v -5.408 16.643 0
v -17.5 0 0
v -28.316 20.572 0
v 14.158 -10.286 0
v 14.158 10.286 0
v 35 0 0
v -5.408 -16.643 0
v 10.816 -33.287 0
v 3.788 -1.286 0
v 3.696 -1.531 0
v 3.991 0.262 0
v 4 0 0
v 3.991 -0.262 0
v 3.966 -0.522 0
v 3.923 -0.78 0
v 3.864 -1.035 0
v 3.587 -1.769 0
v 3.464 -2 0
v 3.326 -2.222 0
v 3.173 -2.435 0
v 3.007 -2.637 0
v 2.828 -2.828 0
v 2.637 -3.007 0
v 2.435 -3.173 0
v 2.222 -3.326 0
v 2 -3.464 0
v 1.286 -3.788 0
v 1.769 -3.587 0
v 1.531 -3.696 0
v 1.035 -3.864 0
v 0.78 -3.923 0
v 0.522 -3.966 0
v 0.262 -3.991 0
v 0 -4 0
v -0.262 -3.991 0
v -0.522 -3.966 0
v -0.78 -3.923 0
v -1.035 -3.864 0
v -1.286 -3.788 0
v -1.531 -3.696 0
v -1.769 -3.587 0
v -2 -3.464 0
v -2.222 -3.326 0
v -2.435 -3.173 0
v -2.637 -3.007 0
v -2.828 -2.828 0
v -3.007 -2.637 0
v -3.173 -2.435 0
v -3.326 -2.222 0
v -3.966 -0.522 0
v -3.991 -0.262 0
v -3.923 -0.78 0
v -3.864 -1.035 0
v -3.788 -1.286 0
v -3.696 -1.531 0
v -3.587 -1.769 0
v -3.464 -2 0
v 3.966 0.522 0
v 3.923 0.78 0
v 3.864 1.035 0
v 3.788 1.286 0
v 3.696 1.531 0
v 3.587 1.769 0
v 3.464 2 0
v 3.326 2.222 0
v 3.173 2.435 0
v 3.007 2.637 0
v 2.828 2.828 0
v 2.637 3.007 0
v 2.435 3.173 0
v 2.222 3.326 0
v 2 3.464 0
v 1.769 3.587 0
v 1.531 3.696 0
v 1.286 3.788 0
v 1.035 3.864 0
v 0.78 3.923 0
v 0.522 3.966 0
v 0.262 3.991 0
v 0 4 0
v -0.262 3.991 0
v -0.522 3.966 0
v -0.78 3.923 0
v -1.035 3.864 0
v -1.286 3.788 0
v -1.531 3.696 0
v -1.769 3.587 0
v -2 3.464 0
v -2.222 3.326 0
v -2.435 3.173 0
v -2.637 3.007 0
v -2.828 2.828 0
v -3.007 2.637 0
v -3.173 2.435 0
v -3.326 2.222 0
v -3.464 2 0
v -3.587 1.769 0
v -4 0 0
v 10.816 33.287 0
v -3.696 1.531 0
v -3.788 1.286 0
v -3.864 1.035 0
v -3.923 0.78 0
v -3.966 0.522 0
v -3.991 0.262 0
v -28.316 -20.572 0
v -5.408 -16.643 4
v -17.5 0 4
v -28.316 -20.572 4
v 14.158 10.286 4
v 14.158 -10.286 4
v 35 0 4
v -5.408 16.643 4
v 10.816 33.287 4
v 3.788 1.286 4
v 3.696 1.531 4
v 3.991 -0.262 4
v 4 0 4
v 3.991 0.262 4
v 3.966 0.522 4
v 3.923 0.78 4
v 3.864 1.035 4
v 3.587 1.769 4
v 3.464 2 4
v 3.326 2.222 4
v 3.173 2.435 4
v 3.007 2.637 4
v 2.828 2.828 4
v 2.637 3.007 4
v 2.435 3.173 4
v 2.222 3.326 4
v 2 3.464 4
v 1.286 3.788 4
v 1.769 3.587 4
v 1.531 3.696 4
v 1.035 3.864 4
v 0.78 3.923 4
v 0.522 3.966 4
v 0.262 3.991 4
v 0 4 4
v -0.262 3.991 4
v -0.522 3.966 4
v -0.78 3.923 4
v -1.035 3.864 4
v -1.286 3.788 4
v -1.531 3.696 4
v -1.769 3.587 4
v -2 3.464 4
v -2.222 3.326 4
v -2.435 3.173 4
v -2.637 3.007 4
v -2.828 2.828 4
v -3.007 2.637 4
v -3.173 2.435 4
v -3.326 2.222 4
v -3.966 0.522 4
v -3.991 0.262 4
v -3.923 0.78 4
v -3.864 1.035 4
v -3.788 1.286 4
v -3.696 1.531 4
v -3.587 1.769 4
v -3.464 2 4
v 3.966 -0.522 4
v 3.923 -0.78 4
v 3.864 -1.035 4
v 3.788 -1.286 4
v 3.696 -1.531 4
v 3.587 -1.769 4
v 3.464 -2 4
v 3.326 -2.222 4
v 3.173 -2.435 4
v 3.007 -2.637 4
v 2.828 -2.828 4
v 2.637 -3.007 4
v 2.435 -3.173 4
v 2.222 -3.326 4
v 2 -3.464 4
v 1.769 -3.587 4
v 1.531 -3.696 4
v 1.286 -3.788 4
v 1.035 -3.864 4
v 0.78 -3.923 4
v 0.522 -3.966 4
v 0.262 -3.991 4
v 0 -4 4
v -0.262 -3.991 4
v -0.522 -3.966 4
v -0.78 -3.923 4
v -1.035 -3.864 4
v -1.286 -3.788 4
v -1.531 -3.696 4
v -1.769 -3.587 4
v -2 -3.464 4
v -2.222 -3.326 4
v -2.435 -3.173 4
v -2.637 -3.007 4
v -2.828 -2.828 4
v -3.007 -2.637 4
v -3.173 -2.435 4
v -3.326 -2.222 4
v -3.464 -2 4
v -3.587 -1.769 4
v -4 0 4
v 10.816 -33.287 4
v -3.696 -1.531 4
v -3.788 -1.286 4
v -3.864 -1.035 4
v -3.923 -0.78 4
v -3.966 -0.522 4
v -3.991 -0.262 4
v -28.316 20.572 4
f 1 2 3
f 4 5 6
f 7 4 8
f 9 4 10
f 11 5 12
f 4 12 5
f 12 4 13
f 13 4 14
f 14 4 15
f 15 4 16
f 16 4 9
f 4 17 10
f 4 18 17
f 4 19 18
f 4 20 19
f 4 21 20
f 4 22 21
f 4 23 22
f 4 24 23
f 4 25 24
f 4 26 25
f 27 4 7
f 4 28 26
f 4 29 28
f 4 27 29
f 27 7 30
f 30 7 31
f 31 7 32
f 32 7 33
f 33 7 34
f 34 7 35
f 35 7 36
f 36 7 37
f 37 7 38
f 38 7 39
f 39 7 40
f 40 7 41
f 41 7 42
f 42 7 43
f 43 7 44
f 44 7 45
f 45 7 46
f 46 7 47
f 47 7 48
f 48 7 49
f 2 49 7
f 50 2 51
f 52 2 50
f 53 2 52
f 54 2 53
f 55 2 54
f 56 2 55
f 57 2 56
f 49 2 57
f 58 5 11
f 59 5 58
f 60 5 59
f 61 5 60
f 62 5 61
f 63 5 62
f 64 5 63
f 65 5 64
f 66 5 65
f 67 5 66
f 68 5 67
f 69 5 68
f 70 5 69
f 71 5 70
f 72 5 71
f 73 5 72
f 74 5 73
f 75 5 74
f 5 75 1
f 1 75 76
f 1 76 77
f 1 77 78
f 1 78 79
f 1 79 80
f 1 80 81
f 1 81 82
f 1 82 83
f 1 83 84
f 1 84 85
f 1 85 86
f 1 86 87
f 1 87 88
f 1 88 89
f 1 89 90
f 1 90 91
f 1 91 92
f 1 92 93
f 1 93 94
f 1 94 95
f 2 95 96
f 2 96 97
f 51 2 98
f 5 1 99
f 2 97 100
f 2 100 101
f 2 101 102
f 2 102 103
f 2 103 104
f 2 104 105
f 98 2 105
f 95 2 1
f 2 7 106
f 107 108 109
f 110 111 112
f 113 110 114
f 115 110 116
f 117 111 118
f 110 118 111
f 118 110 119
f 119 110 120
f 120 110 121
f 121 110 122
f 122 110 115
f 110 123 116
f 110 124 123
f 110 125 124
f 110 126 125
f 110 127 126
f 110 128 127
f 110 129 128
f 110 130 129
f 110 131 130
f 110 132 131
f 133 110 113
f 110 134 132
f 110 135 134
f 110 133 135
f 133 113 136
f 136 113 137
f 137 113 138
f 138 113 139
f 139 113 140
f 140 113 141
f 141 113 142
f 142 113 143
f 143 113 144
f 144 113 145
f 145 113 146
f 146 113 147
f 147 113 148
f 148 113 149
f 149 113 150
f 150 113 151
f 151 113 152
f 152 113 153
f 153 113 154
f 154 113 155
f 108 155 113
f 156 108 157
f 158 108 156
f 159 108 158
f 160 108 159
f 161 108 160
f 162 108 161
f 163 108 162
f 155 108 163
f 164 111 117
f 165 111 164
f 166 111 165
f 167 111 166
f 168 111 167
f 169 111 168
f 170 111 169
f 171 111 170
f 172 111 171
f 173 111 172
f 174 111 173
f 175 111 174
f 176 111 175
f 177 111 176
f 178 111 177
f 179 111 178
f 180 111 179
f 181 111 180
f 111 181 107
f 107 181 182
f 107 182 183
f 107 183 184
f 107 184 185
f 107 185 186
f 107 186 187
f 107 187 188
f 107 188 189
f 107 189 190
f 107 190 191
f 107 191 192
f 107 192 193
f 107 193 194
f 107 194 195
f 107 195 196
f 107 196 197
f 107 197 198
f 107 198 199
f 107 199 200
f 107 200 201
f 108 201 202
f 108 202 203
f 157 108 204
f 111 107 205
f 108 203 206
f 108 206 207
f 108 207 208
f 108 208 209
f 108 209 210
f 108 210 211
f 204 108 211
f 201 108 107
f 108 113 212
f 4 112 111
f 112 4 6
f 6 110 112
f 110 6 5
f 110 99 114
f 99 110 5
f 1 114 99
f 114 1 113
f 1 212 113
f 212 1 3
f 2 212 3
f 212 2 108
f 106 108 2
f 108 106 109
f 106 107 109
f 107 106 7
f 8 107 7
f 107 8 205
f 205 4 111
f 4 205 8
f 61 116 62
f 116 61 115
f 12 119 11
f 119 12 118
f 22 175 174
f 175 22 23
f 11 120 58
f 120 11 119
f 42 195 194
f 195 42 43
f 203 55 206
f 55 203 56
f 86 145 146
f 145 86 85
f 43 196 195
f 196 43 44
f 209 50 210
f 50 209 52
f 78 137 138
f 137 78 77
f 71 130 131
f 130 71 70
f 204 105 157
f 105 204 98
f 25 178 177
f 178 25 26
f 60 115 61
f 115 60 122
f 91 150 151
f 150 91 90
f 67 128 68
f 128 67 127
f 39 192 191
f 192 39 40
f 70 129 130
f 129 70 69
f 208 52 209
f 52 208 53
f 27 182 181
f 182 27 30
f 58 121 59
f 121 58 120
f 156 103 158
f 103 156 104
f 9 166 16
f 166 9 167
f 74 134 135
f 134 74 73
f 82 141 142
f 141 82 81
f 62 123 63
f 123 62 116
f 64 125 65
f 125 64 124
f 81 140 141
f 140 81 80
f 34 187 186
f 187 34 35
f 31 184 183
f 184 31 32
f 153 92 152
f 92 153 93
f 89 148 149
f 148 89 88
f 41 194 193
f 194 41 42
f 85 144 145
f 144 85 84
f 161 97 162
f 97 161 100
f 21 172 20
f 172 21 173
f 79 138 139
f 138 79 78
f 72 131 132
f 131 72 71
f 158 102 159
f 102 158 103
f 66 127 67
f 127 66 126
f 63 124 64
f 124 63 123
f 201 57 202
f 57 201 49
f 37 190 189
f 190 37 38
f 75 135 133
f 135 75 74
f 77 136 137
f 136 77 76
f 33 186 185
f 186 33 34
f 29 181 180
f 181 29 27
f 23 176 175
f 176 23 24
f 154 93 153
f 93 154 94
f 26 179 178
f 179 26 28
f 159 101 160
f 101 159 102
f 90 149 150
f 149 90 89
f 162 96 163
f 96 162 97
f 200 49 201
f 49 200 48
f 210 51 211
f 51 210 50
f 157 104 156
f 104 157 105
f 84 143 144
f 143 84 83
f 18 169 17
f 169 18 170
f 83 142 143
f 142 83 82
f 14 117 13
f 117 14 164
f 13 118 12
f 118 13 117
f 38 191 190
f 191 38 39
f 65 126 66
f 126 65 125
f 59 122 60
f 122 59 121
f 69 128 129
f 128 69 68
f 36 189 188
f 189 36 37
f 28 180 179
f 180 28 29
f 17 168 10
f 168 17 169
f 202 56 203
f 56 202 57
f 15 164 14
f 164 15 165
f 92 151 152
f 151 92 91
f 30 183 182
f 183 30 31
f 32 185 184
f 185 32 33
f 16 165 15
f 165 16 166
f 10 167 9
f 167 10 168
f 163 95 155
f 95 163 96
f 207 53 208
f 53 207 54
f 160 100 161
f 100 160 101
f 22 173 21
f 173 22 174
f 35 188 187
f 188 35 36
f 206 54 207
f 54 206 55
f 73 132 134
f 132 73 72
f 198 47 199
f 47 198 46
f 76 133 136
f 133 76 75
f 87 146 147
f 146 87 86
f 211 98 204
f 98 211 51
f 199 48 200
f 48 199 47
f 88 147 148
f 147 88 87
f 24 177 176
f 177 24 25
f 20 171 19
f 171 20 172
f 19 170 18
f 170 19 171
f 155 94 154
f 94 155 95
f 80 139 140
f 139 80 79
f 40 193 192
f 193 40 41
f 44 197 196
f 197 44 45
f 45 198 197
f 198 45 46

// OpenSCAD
// Star-shaped indexing wheel
// 5-pointed star plate with a centre through-hole

// ---------- Parameters ----------
n_points     = 5;     // number of star points
r_outer      = 35;    // radius of outer (tip) points [mm]
r_inner      = 17.5;  // radius of inner (valley) points [mm]
plate_t      = 4;     // plate thickness [mm]
hole_d       = 8;     // centre hole diameter [mm]
cut_overlap  = 0.5;   // extra length on cutting shapes past faces [mm]
$fn          = 96;    // resolution for curved shapes

// ---------- Derived ----------
step = 360 / (2 * n_points);   // angle between successive vertices

// Star outline: alternates outer and inner points, first outer point on +X
star_pts = [
    for (i = [0 : 2 * n_points - 1])
        let (r = (i % 2 == 0) ? r_outer : r_inner,
             a = i * step)
        [r * cos(a), r * sin(a)]
];

// ---------- Model ----------
difference() {
    // Star plate resting on the bed
    linear_extrude(height = plate_t)
        polygon(points = star_pts);

    // Centre through-hole, extending past top and bottom faces
    translate([0, 0, -cut_overlap])
        cylinder(d = hole_d, h = plate_t + 2 * cut_overlap, $fn = 96);
}
